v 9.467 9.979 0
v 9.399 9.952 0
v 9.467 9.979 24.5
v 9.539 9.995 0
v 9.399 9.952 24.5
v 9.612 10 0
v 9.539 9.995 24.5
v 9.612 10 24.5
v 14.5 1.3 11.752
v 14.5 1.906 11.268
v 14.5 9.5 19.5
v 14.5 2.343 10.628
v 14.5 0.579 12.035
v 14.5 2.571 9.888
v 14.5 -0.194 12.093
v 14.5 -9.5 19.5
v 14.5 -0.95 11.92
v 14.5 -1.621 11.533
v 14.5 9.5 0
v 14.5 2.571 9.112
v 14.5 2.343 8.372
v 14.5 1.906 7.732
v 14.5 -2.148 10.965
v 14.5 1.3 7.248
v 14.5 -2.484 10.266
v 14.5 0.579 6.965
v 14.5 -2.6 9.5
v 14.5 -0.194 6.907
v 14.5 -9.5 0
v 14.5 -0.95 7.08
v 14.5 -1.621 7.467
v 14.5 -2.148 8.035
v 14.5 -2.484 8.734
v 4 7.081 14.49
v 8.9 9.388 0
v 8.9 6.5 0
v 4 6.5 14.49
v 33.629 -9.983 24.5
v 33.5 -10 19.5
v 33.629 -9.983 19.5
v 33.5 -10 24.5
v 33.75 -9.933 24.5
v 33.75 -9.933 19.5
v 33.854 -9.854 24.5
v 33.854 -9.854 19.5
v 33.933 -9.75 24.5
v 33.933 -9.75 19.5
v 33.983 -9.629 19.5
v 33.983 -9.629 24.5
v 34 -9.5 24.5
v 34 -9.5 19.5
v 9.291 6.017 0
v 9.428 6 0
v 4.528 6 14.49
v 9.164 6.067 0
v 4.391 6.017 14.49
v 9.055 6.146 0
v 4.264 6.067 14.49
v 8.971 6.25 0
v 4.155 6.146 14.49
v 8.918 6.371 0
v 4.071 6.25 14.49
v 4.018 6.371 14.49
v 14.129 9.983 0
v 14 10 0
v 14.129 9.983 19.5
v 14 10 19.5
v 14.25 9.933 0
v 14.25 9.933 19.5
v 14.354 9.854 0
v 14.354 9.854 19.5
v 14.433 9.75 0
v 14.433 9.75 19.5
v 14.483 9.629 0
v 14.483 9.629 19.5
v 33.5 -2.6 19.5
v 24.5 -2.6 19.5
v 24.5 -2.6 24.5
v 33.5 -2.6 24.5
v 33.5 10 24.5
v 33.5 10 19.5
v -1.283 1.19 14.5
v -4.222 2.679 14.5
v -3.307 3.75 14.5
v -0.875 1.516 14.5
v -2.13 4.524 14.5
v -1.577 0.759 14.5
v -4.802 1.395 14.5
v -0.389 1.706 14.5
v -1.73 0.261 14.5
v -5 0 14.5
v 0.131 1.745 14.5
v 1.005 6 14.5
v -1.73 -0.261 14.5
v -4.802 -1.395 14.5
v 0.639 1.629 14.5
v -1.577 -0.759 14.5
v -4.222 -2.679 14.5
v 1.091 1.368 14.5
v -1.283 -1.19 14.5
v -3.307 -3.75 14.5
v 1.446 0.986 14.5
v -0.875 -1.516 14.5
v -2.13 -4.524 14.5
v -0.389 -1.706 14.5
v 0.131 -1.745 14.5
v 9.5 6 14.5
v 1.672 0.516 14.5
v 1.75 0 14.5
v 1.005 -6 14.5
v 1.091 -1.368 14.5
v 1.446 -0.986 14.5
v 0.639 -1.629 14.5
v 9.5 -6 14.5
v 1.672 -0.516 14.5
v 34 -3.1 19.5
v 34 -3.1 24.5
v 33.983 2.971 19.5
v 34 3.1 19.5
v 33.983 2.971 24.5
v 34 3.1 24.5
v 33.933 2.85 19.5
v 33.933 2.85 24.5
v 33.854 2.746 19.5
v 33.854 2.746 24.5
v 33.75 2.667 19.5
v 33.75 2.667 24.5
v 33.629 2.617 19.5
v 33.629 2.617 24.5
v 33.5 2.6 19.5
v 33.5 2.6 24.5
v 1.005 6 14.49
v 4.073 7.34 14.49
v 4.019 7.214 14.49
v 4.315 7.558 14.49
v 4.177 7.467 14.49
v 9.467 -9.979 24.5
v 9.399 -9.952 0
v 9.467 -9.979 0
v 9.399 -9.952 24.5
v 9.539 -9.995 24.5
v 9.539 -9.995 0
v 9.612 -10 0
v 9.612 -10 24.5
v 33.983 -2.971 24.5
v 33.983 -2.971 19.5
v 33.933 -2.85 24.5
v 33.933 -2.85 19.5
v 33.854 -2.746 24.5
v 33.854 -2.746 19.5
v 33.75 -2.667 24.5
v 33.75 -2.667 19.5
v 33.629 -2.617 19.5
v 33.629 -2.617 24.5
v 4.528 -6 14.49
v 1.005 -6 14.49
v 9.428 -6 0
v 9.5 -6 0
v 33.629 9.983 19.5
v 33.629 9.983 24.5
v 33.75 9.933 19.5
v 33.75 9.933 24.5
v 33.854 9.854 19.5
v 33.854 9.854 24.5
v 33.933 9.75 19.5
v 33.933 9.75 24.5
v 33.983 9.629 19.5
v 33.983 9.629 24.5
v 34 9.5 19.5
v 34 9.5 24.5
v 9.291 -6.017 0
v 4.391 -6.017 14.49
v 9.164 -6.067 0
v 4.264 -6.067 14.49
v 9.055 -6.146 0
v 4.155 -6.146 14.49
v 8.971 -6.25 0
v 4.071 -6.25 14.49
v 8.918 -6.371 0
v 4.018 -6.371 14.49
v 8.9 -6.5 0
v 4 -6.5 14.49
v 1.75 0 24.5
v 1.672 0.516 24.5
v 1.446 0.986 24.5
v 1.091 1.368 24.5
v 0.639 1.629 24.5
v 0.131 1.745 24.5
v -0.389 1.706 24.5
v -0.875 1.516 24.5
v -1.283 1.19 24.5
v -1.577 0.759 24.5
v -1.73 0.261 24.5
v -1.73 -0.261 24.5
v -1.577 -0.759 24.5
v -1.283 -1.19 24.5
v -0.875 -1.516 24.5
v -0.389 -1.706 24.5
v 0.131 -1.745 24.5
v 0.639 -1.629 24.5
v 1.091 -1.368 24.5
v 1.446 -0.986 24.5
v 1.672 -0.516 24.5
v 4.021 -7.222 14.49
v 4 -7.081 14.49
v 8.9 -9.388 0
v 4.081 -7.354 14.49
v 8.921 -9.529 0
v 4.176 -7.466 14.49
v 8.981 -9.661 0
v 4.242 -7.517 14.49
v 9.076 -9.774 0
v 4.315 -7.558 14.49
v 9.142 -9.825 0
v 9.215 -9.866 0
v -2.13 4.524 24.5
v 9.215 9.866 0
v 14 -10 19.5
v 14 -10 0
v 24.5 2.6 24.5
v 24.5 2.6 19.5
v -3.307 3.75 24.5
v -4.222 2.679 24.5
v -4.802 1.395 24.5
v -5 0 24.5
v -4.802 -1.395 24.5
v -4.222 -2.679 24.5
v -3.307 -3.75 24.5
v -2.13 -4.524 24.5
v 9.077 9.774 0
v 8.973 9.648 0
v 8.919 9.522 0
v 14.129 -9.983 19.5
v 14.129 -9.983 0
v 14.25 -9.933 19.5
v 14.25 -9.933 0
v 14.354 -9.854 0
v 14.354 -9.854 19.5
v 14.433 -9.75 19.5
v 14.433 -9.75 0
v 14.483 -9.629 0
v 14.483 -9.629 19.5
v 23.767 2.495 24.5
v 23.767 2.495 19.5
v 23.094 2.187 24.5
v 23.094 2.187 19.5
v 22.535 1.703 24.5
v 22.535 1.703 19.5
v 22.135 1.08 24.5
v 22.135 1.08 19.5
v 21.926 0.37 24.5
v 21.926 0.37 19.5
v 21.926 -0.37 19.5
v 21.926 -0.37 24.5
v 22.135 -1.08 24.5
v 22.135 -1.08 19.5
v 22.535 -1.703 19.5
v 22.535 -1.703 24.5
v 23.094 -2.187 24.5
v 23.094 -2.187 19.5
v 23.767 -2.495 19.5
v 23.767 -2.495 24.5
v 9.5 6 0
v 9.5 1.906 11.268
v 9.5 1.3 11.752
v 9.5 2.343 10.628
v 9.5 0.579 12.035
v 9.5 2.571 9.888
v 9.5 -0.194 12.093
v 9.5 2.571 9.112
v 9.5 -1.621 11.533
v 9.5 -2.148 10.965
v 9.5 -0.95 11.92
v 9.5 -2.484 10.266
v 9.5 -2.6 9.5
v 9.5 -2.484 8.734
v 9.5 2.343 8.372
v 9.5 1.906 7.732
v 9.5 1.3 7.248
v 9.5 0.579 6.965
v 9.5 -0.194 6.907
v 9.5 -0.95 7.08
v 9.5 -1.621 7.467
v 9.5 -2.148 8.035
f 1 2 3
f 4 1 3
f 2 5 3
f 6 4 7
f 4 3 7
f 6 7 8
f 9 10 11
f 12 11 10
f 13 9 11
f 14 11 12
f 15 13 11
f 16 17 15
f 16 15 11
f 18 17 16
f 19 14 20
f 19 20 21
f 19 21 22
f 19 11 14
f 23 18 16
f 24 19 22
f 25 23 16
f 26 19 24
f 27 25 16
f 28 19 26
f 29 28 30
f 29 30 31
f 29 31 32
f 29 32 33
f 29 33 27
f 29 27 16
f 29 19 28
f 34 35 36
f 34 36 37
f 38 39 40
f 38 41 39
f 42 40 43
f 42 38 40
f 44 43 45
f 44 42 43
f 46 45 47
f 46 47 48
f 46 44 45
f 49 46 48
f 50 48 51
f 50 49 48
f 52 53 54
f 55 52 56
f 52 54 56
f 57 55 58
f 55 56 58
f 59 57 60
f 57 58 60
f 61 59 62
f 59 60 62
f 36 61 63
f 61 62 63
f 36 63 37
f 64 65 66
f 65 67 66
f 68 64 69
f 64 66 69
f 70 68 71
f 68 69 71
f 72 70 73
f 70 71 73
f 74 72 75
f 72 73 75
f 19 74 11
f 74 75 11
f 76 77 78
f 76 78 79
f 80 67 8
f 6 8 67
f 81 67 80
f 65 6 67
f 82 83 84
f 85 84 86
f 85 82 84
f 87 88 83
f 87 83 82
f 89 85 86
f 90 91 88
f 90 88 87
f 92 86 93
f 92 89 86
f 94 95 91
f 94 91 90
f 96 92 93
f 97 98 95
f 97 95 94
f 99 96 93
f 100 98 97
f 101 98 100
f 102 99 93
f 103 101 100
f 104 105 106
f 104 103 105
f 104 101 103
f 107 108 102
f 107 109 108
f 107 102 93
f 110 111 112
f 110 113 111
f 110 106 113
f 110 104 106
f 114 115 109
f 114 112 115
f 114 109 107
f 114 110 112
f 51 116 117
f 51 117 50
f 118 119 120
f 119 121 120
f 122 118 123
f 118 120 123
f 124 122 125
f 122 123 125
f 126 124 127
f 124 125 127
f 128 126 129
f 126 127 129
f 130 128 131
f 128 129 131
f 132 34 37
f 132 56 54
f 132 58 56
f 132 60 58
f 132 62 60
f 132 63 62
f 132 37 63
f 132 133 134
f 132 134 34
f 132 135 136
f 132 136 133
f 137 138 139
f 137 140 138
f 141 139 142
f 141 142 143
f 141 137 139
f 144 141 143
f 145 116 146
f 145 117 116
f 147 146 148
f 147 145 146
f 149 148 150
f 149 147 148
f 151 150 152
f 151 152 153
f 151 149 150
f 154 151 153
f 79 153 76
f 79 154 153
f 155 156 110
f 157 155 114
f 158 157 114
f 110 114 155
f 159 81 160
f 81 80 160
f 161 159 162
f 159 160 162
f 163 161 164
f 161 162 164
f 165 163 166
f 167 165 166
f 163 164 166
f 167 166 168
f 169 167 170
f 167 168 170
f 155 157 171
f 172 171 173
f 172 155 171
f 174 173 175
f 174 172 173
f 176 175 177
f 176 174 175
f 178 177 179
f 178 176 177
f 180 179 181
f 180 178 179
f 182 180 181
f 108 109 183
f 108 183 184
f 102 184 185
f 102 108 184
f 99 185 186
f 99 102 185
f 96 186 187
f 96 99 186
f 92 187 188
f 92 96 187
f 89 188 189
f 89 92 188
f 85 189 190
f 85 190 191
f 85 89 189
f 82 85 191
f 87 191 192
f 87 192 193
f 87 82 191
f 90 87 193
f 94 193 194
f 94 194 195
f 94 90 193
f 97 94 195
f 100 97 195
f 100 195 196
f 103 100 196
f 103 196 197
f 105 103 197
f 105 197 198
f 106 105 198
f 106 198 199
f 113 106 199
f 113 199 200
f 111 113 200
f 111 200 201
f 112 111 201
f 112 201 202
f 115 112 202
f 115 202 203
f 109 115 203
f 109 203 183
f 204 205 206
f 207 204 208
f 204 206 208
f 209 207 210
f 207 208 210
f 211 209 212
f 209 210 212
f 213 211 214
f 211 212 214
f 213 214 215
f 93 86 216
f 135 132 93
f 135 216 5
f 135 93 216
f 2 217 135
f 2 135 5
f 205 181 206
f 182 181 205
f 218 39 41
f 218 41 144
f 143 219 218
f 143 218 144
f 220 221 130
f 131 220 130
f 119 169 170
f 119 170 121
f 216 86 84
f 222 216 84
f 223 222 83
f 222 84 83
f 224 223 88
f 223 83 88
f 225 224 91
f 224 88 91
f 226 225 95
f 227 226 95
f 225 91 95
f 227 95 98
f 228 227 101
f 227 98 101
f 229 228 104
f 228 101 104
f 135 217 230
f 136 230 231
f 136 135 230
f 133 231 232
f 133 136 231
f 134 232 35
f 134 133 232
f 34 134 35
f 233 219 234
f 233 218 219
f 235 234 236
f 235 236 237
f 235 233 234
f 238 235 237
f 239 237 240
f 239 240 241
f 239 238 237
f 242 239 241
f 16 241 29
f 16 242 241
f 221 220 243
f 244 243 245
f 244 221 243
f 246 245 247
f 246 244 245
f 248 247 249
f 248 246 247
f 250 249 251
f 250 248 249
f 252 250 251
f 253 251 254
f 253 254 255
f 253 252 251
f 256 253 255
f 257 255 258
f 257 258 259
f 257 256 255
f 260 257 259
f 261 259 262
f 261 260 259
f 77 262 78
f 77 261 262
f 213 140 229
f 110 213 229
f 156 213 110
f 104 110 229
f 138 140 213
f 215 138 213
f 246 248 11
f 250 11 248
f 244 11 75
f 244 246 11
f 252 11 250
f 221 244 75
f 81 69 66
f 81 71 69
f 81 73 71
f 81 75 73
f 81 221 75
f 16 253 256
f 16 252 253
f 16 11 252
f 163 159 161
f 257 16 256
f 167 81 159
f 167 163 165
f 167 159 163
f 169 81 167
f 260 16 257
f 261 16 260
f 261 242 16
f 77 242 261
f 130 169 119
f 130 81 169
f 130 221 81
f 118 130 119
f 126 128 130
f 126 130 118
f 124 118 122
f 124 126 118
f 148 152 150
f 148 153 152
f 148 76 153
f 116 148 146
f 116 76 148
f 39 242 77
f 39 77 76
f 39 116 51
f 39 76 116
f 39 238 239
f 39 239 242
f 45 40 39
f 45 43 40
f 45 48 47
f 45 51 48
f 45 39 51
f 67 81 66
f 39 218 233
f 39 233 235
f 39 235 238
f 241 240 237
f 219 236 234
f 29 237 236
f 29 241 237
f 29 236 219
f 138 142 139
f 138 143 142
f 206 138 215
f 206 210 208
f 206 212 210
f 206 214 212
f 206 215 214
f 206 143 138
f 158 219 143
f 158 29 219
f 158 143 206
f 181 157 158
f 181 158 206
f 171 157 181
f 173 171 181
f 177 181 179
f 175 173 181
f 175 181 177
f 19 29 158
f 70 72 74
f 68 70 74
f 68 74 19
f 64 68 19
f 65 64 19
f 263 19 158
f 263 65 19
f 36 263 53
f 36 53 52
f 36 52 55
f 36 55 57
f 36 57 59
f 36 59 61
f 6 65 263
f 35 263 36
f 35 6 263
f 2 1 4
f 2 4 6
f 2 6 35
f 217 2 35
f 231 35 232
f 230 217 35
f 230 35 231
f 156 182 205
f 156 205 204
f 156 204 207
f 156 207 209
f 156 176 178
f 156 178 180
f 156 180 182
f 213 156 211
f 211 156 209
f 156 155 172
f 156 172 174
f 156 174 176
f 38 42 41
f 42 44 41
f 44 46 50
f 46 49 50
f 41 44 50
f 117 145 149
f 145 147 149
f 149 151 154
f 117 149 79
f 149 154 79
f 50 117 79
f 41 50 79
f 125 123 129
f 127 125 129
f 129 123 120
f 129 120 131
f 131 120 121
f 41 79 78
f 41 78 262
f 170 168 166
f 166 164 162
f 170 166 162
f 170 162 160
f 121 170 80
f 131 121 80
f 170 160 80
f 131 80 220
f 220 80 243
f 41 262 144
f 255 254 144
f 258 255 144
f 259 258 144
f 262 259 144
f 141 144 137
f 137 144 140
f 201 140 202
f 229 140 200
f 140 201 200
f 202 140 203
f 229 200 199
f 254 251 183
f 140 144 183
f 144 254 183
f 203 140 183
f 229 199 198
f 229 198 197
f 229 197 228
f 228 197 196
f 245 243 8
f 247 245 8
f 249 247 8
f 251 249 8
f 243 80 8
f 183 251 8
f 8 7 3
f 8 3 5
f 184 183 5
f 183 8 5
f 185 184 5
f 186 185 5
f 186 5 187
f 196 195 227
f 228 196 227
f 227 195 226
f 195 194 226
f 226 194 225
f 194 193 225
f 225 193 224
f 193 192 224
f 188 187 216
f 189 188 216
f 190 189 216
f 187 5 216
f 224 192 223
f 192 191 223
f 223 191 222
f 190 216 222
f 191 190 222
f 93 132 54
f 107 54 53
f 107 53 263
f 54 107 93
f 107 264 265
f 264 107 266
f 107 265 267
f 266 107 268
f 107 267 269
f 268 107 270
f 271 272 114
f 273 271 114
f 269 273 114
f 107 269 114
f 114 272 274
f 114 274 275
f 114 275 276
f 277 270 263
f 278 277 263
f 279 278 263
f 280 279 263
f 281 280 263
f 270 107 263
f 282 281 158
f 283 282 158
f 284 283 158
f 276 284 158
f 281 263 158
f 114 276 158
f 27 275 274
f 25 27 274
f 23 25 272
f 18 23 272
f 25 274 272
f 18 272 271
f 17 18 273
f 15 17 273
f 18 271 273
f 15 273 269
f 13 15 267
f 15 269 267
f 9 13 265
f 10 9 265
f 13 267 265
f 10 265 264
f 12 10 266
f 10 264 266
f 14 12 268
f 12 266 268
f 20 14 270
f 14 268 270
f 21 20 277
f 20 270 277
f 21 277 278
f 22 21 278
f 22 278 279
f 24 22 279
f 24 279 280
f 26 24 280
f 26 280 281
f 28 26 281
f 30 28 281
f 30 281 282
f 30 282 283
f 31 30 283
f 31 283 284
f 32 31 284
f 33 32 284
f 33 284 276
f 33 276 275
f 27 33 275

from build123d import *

# Parameters (mm, degrees)
SKETCH_R        = 1.75
PAD_DEPTH       = 24.5
SKETCH001_W     = 15
SKETCH001_H     = 12
POCKET_DEPTH    = 14.5
SKETCH002_W     = 20
SKETCH002_H     = 20
POCKET001_DEPTH = 19.5
SKETCH003_R     = 2.6
POCKET002_DEPTH = 24.501
POCKET003_DEPTH = 20.001
FILLET_R        = 0.5


with BuildPart() as part:
    # Sketch → Pad (new body)
    with BuildSketch(Plane.XY):
        with BuildLine():
            Line((-2.130082, 4.523577), (9.5, 10))
            Line((9.5, 10), (34, 10))
            Line((34, 10), (34, 2.6))
            Line((24.5, 2.6), (34, 2.6))
            ThreePointArc((24.5, 2.6), (21.9, 0), (24.5, -2.6))
            Line((24.5, -2.6), (34, -2.6))
            Line((34, -2.6), (34, -10))
            Line((34, -10), (9.5, -10))
            Line((9.5, -10), (-2.130082, -4.523577))
            ThreePointArc((-2.130082, 4.523577), (-5, 0), (-2.130082, -4.523577))
        make_face()
        Circle(SKETCH_R, mode=Mode.SUBTRACT)
    extrude(amount=PAD_DEPTH)

    # Sketch001 (on Face12 of Pad) → Pocket (cut)
    with BuildSketch(Plane(origin=(0, 0, 0), x_dir=(1, 0, 0), z_dir=(0, 0, -1))):
        with Locations((2, 0)):
            Rectangle(SKETCH001_W, SKETCH001_H)
    extrude(amount=-POCKET_DEPTH, mode=Mode.SUBTRACT)

    # Sketch002 (on Face4 of Pocket) → Pocket001 (cut)
    with BuildSketch(Plane(origin=(0, 0, 0), x_dir=(1, 0, 0), z_dir=(0, 0, -1))):
        with Locations((24.5, 0)):
            Rectangle(SKETCH002_W, SKETCH002_H)
    extrude(amount=-POCKET001_DEPTH, mode=Mode.SUBTRACT)

    # Sketch003 (on Face9 of Pocket001) → Pocket002 (cut, through all)
    with BuildSketch(Plane(origin=(9.5, 0, 0), x_dir=(0, -1, 0), z_dir=(-1, 0, 0))):
        with Locations((0, 9.5)):
            Circle(SKETCH003_R)
    extrude(amount=-POCKET002_DEPTH, mode=Mode.SUBTRACT)

    # Sketch004 (on Face5 of Pocket002) → Pocket003 (cut, through all)
    with BuildSketch(Plane(origin=(0, 10, 0), x_dir=(-1, 0, 0), z_dir=(0, 1, 0))):
        Polygon((-8.9, 0), (-4, 14.49), (0, 14.49), (0, 0), align=None)
    extrude(amount=-POCKET003_DEPTH, mode=Mode.SUBTRACT)

    # Fillet
    fillet_edges = [part.edges().sort_by_distance(p)[0] for p in [
        (6.45, -8.563803, 7.245),
        (6.45, -6, 7.245),
        (6.45, 6, 7.245),
        (6.45, 8.563803, 7.245),
        (14.5, -10, 9.75),
        (14.5, 10, 9.75),
        (34, -2.6, 22),
        (34, 2.6, 22),
        (9.5, -10, 12.25),
        (9.5, 10, 12.25),
        (34, -10, 22),
        (34, 10, 22),
    ]]
    fillet(fillet_edges, radius=FILLET_R)


solid = part.part
